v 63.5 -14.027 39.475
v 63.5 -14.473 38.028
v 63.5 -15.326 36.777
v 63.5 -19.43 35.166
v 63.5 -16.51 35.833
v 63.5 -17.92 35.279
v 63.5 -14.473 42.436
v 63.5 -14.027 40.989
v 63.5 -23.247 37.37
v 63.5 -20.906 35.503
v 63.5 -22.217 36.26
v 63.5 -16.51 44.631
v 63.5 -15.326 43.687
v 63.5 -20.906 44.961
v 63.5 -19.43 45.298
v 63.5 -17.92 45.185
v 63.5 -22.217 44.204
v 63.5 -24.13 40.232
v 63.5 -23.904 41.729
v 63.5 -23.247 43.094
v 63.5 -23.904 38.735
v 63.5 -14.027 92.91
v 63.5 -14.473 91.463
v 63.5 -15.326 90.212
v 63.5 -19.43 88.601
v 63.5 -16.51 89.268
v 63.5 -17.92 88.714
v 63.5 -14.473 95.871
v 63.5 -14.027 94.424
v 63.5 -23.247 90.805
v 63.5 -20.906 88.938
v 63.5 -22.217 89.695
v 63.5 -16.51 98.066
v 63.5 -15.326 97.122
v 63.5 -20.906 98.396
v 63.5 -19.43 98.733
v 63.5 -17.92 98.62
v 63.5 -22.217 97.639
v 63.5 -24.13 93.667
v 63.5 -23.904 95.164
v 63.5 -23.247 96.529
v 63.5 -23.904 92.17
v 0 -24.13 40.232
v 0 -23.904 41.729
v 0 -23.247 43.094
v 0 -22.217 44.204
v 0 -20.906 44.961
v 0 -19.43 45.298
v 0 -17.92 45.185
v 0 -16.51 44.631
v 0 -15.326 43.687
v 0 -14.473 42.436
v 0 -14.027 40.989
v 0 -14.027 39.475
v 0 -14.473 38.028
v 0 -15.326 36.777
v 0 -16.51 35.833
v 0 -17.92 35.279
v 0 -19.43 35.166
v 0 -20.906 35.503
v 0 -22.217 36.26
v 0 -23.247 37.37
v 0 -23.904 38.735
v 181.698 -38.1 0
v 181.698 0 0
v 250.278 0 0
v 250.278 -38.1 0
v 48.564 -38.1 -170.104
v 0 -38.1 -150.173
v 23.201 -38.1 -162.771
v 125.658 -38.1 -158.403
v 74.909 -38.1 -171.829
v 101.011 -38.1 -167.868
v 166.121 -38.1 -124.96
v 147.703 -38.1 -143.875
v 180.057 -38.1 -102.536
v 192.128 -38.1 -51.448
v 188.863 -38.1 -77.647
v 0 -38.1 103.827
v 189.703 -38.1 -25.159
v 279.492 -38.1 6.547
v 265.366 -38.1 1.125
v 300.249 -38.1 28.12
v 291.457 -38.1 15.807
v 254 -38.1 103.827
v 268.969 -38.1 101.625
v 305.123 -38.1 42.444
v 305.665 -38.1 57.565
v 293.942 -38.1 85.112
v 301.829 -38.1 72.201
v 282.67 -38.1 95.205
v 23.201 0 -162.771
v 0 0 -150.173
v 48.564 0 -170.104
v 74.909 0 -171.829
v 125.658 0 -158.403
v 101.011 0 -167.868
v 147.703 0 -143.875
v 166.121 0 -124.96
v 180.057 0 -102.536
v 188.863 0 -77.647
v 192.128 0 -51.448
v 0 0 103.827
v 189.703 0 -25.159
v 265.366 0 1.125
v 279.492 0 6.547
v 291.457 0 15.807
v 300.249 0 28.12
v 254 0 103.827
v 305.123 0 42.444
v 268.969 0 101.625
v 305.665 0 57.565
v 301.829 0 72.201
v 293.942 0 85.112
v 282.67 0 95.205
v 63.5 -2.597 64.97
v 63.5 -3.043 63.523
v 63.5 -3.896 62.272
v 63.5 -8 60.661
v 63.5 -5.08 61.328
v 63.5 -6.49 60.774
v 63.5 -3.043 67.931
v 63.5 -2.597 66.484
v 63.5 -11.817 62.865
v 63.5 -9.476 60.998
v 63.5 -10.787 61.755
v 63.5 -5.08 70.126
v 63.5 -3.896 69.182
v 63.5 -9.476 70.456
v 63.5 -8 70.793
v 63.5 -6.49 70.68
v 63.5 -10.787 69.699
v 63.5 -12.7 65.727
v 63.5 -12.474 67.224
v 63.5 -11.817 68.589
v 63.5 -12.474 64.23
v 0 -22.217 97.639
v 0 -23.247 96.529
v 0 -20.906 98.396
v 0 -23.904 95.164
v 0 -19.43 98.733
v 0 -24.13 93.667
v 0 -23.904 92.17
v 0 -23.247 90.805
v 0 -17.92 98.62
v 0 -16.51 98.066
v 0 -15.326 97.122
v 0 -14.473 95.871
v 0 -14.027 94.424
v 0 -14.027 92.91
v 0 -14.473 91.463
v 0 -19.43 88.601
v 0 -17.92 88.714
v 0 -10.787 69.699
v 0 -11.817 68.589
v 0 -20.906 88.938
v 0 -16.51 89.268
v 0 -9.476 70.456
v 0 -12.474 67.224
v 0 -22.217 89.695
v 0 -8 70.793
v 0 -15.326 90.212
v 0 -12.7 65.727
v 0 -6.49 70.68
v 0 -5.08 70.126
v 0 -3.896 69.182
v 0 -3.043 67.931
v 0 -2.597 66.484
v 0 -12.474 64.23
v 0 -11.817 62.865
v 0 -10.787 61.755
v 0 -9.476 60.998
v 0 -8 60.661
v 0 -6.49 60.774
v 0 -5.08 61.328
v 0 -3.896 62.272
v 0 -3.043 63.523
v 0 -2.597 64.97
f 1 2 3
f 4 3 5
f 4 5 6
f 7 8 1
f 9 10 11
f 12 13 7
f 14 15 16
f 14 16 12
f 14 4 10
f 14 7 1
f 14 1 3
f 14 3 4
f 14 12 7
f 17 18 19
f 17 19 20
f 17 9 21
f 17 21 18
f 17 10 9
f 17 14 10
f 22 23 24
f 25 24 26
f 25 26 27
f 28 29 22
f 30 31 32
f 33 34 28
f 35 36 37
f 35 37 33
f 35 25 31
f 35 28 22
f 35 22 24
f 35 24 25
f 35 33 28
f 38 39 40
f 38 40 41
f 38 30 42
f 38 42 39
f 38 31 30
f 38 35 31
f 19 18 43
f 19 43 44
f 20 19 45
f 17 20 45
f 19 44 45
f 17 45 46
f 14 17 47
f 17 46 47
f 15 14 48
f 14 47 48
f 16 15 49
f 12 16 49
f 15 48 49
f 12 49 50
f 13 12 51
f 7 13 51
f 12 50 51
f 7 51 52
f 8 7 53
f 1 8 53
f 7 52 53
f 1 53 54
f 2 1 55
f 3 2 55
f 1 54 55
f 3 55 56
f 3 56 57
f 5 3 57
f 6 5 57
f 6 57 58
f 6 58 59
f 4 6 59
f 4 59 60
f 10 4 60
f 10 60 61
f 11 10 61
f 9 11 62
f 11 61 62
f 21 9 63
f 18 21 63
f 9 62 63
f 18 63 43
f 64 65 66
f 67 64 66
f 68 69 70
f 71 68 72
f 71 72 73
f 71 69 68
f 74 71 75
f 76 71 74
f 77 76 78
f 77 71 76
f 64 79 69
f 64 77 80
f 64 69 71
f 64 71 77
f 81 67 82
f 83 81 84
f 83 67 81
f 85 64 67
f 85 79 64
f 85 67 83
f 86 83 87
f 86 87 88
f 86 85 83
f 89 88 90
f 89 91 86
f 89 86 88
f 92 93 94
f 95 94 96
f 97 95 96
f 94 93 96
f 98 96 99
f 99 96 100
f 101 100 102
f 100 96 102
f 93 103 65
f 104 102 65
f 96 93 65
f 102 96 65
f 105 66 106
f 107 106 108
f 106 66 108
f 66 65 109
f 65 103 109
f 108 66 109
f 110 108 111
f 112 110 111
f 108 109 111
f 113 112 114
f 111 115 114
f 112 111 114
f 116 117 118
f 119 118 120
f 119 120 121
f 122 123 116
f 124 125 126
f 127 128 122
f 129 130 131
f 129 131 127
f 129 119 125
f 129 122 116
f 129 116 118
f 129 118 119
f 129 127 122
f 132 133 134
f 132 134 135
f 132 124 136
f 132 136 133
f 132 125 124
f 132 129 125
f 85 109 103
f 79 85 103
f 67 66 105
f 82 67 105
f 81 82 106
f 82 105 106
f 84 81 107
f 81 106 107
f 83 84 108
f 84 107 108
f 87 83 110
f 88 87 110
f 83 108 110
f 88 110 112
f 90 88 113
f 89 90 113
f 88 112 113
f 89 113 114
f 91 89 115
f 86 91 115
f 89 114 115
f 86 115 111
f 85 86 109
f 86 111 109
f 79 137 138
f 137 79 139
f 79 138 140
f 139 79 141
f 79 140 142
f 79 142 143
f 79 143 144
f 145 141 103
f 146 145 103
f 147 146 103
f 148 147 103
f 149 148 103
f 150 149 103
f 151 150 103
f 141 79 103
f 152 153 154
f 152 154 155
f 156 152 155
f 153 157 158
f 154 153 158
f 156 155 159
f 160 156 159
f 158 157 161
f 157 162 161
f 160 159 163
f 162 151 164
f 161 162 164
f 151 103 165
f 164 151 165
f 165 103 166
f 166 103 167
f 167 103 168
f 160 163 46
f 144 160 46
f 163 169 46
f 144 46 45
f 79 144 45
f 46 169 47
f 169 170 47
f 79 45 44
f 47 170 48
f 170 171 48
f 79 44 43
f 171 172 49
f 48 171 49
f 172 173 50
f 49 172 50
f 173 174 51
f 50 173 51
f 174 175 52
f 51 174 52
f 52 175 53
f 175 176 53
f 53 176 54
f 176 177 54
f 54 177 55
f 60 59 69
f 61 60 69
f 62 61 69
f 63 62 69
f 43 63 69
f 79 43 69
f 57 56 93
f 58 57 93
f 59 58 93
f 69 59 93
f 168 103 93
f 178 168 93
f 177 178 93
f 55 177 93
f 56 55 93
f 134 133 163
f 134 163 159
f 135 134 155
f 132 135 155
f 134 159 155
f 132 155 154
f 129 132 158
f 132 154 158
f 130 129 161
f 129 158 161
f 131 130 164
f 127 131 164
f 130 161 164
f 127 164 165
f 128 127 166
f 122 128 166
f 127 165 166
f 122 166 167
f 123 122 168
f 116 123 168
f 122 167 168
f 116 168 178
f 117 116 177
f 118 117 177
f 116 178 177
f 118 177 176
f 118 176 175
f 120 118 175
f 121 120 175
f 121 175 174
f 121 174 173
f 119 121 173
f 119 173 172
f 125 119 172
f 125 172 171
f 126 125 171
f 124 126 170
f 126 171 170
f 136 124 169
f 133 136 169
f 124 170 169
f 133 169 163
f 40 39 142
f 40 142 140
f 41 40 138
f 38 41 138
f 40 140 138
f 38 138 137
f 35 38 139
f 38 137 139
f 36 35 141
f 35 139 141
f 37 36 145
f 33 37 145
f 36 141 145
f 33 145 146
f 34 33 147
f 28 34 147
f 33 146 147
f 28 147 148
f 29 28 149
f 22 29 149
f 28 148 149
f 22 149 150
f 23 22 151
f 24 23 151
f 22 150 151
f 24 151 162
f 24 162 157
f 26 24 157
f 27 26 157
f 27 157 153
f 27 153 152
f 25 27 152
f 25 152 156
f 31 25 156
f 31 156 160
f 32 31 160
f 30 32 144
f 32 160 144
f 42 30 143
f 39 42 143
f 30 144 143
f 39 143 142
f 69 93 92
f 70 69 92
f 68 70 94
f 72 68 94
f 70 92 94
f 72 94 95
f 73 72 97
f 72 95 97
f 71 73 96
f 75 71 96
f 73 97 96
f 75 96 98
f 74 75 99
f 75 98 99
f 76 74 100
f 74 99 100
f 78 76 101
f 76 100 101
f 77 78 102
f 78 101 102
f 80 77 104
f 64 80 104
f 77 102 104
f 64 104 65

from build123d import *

# Parameters (mm, degrees)
F1_DEPTH = 38.1
F3_R     = 5.08
F4_DEPTH = 63.5


with BuildPart() as f1:
    # F0 (on Front) → F1 (new body)
    with BuildSketch(Plane.XZ):
        with BuildLine():
            Line((0, 103.827015), (0, -150.172985))
            ThreePointArc((0, -150.172985), (147.702772, -143.875268), (181.698026, 0))
            Line((181.698026, 0), (250.278026, 0))
            ThreePointArc((250.278026, 0), (305.946853, 49.984613), (254, 103.827015))
            Line((254, 103.827015), (0, 103.827015))
        make_face()
    extrude(amount=F1_DEPTH)

    # F3 (on face) → F4 (cut)
    with BuildSketch(Plane(origin=(0, 0, 0), x_dir=(0, -1, 0), z_dir=(-1, 0, 0))):
        with Locations((19.05, 93.667015)):
            Circle(F3_R)
        with Locations((7.62, 65.727015)):
            Circle(F3_R)
        with Locations((19.05, 40.231943)):
            Circle(F3_R)
    extrude(amount=-F4_DEPTH, mode=Mode.SUBTRACT)


solid = f1.part
